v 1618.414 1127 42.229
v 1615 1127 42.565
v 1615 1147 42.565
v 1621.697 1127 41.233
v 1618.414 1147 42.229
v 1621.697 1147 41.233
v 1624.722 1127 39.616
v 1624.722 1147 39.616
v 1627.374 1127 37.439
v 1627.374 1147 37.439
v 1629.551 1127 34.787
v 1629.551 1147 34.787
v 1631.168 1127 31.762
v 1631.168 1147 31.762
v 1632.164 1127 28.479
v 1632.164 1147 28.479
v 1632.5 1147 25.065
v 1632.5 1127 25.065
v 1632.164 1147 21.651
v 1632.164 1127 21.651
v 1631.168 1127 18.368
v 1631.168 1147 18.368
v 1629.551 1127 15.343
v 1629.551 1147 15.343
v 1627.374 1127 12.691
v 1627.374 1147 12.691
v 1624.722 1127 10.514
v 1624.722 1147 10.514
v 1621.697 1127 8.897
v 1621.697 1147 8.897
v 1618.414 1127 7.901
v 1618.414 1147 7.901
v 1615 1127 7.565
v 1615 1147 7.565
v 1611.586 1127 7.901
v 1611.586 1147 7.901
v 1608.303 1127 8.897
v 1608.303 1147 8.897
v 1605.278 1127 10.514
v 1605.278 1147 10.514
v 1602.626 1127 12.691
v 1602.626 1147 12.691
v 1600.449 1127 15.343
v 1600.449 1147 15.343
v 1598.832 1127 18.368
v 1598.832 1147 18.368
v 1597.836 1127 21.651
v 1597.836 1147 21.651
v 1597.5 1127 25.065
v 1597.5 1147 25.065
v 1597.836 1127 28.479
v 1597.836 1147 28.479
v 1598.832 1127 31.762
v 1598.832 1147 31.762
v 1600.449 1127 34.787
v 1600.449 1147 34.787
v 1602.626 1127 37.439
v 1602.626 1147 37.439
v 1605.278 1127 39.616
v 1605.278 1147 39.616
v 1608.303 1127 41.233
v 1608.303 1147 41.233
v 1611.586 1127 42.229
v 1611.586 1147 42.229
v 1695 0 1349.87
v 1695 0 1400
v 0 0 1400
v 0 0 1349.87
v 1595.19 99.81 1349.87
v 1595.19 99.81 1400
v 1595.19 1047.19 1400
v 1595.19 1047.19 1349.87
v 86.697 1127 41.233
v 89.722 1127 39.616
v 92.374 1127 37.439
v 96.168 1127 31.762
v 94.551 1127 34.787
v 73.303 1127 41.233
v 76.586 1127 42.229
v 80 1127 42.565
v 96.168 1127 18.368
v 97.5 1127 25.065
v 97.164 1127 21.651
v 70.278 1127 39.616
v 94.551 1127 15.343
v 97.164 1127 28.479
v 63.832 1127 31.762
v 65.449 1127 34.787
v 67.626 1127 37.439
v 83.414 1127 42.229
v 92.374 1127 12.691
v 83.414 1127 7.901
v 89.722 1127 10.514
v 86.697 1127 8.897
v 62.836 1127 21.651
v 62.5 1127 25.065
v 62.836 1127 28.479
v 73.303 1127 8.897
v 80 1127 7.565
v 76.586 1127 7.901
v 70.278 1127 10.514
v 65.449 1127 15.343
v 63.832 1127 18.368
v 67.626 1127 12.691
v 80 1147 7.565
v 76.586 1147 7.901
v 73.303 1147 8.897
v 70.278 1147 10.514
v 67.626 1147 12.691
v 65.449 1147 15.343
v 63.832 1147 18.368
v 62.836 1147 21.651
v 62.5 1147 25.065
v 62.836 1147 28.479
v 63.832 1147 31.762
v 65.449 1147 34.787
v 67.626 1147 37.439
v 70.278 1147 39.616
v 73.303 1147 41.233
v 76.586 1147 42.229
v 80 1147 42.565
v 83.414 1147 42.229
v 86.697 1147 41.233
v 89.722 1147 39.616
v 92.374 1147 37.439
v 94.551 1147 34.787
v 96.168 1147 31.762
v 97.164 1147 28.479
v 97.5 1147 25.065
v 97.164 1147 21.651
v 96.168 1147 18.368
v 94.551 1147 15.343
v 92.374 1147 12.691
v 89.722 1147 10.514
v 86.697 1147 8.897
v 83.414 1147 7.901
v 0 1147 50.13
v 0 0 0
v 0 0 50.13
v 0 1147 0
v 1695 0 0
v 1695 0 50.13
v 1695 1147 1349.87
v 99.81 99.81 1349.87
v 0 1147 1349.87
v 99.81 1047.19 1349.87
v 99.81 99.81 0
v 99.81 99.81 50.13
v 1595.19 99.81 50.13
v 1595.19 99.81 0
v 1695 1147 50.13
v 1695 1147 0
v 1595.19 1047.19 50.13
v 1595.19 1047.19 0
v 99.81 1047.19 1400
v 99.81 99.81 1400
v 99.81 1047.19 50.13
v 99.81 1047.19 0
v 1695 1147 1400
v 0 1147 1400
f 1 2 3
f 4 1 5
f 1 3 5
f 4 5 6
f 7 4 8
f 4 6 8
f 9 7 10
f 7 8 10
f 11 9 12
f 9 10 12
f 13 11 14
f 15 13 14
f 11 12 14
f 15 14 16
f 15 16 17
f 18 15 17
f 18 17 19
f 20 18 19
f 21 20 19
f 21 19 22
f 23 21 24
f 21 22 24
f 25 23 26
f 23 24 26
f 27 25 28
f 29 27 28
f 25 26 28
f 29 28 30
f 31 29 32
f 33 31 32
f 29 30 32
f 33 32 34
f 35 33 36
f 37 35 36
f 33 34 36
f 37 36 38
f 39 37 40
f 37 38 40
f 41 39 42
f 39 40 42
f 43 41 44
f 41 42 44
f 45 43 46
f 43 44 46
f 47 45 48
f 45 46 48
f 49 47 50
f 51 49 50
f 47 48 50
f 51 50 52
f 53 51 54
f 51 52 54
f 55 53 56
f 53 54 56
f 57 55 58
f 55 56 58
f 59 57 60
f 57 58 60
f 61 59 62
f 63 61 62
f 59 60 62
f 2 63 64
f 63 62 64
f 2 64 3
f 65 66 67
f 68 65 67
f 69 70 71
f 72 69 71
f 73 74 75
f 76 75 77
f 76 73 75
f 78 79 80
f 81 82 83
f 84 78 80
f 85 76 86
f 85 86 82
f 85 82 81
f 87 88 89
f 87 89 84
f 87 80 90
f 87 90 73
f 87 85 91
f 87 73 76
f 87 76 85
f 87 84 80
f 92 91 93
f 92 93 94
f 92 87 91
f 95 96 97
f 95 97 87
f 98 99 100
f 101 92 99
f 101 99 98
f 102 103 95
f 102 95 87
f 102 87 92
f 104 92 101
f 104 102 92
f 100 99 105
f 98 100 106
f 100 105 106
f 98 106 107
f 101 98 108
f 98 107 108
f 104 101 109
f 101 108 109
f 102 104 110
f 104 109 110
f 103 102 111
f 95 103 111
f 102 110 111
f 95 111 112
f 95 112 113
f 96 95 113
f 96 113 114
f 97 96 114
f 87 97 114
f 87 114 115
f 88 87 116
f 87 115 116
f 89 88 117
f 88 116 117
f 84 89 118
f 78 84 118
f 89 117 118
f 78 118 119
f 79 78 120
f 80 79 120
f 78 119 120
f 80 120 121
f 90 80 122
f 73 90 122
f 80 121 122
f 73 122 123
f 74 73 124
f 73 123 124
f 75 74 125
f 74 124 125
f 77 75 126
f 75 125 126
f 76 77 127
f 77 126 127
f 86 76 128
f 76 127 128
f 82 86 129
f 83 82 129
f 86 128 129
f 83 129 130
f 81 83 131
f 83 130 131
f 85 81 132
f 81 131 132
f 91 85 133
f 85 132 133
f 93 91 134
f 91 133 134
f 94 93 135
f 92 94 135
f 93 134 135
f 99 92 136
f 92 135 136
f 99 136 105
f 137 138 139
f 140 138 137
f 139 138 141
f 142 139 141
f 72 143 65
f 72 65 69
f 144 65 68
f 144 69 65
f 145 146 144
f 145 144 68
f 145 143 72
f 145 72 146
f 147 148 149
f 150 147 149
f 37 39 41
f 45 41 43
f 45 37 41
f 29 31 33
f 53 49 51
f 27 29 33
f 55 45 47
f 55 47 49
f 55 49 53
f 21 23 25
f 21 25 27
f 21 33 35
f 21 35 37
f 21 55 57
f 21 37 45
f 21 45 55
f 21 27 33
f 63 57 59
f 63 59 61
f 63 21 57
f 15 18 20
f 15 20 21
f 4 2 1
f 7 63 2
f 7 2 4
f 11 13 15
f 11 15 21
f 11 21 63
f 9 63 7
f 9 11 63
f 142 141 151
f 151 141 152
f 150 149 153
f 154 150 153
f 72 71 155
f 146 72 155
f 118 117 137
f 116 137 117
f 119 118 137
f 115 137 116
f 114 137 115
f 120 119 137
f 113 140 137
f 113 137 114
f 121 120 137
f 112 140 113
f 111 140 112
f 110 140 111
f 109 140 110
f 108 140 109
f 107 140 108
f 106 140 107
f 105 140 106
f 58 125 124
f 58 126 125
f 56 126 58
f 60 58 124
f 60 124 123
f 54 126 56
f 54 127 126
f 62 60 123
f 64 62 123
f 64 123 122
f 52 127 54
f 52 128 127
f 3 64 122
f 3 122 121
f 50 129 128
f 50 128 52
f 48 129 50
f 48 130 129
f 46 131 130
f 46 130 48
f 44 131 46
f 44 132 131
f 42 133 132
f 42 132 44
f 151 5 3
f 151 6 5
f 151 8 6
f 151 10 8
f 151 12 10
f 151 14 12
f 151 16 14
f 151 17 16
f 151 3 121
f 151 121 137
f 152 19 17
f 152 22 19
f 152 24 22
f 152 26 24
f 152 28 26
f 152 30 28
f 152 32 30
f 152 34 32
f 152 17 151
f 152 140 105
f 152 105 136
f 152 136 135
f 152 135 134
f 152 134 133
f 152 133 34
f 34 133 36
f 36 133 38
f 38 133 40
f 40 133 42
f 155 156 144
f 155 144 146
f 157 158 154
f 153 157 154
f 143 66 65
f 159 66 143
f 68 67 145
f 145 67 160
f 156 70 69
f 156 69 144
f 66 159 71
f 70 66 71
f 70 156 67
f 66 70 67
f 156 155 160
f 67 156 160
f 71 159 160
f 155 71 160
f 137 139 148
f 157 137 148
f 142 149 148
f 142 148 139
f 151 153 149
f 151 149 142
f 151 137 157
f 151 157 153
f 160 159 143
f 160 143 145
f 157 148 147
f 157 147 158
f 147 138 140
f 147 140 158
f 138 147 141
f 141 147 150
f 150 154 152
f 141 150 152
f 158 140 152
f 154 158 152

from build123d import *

# Parameters (mm, degrees)
ESQUISSE8_W             = 1695
ESQUISSE8_H             = 1147
ESQUISSE8_W_2           = 1495.38
ESQUISSE8_H_2           = 457.38
BOSS_EXTRU_8_DEPTH      = 50.13
ESQUISSE9_W             = 1695
ESQUISSE9_H             = 1147
ESQUISSE9_W_2           = 1495.38
ESQUISSE9_H_2           = 457.38
ESQUISSE9_W_3           = 280.38
ESQUISSE9_H_3           = 390.19
ESQUISSE9_W_4           = 425.38
ESQUISSE9_W_5           = 590
ESQUISSE9_H_4           = 58.19
BOSS_EXTRU_9_DEPTH      = 50.13
ESQUISSE12_W            = 1495.38
ESQUISSE12_H            = 490
ENL_V_MAT_EXTRU_1_DEPTH = 50.13
ESQUISSE13_W            = 1495.38
ESQUISSE13_H            = 947.38
ENL_V_MAT_EXTRU_2_DEPTH = 50.13
ESQUISSE14_R            = 17.5
ENL_V_MAT_EXTRU_3_DEPTH = 20


with BuildPart() as part:
    # Esquisse8 → Boss.-Extru.8 (new body)
    with BuildSketch(Plane.XY):
        with Locations((847.5, 573.5)):
            Rectangle(ESQUISSE8_W, ESQUISSE8_H)
        with Locations((847.5, 818.5)):
            Rectangle(ESQUISSE8_W_2, ESQUISSE8_H_2, mode=Mode.SUBTRACT)
    extrude(amount=BOSS_EXTRU_8_DEPTH)

    # Esquisse12 → Enlèv. mat.-Extru.1 (cut)
    with BuildSketch(Plane.XY.offset(50.13)):
        with Locations((847.5, 344.81)):
            Rectangle(ESQUISSE12_W, ESQUISSE12_H)
    extrude(amount=-ENL_V_MAT_EXTRU_1_DEPTH, mode=Mode.SUBTRACT)

    # Esquisse14 → Enlèv. mat.-Extru.3 (cut)
    with BuildSketch(Plane(origin=(0, 1147, 0), x_dir=(1, 0, 0), z_dir=(0, 1, 0))):
        with Locations(Location((1615, -25.065, 0), (0, 0, 270))):
            Circle(ESQUISSE14_R)
        with Locations(Location((80, -25.065, 0), (0, 0, 90))):
            Circle(ESQUISSE14_R)
    extrude(amount=-ENL_V_MAT_EXTRU_3_DEPTH, mode=Mode.SUBTRACT)


with BuildPart() as body_2:
    # Esquisse9 → Boss.-Extru.9 (new body)
    # profile 1 of 2: a face of its own
    with BuildSketch(Plane(origin=(0, 0, 1400), x_dir=(-1, 0, 0), z_dir=(0, 0, -1))):
        with Locations((-847.5, 573.5)):
            Rectangle(ESQUISSE9_W, ESQUISSE9_H)
        with Locations((-847.5, 818.5)):
            Rectangle(ESQUISSE9_W_2, ESQUISSE9_H_2, mode=Mode.SUBTRACT)
        with Locations((-1455, 294.905)):
            Rectangle(ESQUISSE9_W_3, ESQUISSE9_H_3, mode=Mode.SUBTRACT)
        with Locations((-1002.31, 294.905)):
            Rectangle(ESQUISSE9_W_4, ESQUISSE9_H_3, mode=Mode.SUBTRACT)
        with Locations((-394.81, 294.905)):
            Rectangle(ESQUISSE9_W_5, ESQUISSE9_H_3, mode=Mode.SUBTRACT)
    # profile 2 of 2: a face of its own
    with BuildSketch(Plane(origin=(0, 0, 1400), x_dir=(-1, 0, 0), z_dir=(0, 0, -1))):
        with Locations((-1002.31, 460.905)):
            Rectangle(ESQUISSE9_W_4, ESQUISSE9_H_4)
    extrude(amount=BOSS_EXTRU_9_DEPTH)

    # Esquisse13 → Enlèv. mat.-Extru.2 (cut)
    with BuildSketch(Plane.XY.offset(1400)):
        with Locations((847.5, 573.5)):
            Rectangle(ESQUISSE13_W, ESQUISSE13_H)
    extrude(amount=-ENL_V_MAT_EXTRU_2_DEPTH, mode=Mode.SUBTRACT)


solid = Compound([part.part, body_2.part])
